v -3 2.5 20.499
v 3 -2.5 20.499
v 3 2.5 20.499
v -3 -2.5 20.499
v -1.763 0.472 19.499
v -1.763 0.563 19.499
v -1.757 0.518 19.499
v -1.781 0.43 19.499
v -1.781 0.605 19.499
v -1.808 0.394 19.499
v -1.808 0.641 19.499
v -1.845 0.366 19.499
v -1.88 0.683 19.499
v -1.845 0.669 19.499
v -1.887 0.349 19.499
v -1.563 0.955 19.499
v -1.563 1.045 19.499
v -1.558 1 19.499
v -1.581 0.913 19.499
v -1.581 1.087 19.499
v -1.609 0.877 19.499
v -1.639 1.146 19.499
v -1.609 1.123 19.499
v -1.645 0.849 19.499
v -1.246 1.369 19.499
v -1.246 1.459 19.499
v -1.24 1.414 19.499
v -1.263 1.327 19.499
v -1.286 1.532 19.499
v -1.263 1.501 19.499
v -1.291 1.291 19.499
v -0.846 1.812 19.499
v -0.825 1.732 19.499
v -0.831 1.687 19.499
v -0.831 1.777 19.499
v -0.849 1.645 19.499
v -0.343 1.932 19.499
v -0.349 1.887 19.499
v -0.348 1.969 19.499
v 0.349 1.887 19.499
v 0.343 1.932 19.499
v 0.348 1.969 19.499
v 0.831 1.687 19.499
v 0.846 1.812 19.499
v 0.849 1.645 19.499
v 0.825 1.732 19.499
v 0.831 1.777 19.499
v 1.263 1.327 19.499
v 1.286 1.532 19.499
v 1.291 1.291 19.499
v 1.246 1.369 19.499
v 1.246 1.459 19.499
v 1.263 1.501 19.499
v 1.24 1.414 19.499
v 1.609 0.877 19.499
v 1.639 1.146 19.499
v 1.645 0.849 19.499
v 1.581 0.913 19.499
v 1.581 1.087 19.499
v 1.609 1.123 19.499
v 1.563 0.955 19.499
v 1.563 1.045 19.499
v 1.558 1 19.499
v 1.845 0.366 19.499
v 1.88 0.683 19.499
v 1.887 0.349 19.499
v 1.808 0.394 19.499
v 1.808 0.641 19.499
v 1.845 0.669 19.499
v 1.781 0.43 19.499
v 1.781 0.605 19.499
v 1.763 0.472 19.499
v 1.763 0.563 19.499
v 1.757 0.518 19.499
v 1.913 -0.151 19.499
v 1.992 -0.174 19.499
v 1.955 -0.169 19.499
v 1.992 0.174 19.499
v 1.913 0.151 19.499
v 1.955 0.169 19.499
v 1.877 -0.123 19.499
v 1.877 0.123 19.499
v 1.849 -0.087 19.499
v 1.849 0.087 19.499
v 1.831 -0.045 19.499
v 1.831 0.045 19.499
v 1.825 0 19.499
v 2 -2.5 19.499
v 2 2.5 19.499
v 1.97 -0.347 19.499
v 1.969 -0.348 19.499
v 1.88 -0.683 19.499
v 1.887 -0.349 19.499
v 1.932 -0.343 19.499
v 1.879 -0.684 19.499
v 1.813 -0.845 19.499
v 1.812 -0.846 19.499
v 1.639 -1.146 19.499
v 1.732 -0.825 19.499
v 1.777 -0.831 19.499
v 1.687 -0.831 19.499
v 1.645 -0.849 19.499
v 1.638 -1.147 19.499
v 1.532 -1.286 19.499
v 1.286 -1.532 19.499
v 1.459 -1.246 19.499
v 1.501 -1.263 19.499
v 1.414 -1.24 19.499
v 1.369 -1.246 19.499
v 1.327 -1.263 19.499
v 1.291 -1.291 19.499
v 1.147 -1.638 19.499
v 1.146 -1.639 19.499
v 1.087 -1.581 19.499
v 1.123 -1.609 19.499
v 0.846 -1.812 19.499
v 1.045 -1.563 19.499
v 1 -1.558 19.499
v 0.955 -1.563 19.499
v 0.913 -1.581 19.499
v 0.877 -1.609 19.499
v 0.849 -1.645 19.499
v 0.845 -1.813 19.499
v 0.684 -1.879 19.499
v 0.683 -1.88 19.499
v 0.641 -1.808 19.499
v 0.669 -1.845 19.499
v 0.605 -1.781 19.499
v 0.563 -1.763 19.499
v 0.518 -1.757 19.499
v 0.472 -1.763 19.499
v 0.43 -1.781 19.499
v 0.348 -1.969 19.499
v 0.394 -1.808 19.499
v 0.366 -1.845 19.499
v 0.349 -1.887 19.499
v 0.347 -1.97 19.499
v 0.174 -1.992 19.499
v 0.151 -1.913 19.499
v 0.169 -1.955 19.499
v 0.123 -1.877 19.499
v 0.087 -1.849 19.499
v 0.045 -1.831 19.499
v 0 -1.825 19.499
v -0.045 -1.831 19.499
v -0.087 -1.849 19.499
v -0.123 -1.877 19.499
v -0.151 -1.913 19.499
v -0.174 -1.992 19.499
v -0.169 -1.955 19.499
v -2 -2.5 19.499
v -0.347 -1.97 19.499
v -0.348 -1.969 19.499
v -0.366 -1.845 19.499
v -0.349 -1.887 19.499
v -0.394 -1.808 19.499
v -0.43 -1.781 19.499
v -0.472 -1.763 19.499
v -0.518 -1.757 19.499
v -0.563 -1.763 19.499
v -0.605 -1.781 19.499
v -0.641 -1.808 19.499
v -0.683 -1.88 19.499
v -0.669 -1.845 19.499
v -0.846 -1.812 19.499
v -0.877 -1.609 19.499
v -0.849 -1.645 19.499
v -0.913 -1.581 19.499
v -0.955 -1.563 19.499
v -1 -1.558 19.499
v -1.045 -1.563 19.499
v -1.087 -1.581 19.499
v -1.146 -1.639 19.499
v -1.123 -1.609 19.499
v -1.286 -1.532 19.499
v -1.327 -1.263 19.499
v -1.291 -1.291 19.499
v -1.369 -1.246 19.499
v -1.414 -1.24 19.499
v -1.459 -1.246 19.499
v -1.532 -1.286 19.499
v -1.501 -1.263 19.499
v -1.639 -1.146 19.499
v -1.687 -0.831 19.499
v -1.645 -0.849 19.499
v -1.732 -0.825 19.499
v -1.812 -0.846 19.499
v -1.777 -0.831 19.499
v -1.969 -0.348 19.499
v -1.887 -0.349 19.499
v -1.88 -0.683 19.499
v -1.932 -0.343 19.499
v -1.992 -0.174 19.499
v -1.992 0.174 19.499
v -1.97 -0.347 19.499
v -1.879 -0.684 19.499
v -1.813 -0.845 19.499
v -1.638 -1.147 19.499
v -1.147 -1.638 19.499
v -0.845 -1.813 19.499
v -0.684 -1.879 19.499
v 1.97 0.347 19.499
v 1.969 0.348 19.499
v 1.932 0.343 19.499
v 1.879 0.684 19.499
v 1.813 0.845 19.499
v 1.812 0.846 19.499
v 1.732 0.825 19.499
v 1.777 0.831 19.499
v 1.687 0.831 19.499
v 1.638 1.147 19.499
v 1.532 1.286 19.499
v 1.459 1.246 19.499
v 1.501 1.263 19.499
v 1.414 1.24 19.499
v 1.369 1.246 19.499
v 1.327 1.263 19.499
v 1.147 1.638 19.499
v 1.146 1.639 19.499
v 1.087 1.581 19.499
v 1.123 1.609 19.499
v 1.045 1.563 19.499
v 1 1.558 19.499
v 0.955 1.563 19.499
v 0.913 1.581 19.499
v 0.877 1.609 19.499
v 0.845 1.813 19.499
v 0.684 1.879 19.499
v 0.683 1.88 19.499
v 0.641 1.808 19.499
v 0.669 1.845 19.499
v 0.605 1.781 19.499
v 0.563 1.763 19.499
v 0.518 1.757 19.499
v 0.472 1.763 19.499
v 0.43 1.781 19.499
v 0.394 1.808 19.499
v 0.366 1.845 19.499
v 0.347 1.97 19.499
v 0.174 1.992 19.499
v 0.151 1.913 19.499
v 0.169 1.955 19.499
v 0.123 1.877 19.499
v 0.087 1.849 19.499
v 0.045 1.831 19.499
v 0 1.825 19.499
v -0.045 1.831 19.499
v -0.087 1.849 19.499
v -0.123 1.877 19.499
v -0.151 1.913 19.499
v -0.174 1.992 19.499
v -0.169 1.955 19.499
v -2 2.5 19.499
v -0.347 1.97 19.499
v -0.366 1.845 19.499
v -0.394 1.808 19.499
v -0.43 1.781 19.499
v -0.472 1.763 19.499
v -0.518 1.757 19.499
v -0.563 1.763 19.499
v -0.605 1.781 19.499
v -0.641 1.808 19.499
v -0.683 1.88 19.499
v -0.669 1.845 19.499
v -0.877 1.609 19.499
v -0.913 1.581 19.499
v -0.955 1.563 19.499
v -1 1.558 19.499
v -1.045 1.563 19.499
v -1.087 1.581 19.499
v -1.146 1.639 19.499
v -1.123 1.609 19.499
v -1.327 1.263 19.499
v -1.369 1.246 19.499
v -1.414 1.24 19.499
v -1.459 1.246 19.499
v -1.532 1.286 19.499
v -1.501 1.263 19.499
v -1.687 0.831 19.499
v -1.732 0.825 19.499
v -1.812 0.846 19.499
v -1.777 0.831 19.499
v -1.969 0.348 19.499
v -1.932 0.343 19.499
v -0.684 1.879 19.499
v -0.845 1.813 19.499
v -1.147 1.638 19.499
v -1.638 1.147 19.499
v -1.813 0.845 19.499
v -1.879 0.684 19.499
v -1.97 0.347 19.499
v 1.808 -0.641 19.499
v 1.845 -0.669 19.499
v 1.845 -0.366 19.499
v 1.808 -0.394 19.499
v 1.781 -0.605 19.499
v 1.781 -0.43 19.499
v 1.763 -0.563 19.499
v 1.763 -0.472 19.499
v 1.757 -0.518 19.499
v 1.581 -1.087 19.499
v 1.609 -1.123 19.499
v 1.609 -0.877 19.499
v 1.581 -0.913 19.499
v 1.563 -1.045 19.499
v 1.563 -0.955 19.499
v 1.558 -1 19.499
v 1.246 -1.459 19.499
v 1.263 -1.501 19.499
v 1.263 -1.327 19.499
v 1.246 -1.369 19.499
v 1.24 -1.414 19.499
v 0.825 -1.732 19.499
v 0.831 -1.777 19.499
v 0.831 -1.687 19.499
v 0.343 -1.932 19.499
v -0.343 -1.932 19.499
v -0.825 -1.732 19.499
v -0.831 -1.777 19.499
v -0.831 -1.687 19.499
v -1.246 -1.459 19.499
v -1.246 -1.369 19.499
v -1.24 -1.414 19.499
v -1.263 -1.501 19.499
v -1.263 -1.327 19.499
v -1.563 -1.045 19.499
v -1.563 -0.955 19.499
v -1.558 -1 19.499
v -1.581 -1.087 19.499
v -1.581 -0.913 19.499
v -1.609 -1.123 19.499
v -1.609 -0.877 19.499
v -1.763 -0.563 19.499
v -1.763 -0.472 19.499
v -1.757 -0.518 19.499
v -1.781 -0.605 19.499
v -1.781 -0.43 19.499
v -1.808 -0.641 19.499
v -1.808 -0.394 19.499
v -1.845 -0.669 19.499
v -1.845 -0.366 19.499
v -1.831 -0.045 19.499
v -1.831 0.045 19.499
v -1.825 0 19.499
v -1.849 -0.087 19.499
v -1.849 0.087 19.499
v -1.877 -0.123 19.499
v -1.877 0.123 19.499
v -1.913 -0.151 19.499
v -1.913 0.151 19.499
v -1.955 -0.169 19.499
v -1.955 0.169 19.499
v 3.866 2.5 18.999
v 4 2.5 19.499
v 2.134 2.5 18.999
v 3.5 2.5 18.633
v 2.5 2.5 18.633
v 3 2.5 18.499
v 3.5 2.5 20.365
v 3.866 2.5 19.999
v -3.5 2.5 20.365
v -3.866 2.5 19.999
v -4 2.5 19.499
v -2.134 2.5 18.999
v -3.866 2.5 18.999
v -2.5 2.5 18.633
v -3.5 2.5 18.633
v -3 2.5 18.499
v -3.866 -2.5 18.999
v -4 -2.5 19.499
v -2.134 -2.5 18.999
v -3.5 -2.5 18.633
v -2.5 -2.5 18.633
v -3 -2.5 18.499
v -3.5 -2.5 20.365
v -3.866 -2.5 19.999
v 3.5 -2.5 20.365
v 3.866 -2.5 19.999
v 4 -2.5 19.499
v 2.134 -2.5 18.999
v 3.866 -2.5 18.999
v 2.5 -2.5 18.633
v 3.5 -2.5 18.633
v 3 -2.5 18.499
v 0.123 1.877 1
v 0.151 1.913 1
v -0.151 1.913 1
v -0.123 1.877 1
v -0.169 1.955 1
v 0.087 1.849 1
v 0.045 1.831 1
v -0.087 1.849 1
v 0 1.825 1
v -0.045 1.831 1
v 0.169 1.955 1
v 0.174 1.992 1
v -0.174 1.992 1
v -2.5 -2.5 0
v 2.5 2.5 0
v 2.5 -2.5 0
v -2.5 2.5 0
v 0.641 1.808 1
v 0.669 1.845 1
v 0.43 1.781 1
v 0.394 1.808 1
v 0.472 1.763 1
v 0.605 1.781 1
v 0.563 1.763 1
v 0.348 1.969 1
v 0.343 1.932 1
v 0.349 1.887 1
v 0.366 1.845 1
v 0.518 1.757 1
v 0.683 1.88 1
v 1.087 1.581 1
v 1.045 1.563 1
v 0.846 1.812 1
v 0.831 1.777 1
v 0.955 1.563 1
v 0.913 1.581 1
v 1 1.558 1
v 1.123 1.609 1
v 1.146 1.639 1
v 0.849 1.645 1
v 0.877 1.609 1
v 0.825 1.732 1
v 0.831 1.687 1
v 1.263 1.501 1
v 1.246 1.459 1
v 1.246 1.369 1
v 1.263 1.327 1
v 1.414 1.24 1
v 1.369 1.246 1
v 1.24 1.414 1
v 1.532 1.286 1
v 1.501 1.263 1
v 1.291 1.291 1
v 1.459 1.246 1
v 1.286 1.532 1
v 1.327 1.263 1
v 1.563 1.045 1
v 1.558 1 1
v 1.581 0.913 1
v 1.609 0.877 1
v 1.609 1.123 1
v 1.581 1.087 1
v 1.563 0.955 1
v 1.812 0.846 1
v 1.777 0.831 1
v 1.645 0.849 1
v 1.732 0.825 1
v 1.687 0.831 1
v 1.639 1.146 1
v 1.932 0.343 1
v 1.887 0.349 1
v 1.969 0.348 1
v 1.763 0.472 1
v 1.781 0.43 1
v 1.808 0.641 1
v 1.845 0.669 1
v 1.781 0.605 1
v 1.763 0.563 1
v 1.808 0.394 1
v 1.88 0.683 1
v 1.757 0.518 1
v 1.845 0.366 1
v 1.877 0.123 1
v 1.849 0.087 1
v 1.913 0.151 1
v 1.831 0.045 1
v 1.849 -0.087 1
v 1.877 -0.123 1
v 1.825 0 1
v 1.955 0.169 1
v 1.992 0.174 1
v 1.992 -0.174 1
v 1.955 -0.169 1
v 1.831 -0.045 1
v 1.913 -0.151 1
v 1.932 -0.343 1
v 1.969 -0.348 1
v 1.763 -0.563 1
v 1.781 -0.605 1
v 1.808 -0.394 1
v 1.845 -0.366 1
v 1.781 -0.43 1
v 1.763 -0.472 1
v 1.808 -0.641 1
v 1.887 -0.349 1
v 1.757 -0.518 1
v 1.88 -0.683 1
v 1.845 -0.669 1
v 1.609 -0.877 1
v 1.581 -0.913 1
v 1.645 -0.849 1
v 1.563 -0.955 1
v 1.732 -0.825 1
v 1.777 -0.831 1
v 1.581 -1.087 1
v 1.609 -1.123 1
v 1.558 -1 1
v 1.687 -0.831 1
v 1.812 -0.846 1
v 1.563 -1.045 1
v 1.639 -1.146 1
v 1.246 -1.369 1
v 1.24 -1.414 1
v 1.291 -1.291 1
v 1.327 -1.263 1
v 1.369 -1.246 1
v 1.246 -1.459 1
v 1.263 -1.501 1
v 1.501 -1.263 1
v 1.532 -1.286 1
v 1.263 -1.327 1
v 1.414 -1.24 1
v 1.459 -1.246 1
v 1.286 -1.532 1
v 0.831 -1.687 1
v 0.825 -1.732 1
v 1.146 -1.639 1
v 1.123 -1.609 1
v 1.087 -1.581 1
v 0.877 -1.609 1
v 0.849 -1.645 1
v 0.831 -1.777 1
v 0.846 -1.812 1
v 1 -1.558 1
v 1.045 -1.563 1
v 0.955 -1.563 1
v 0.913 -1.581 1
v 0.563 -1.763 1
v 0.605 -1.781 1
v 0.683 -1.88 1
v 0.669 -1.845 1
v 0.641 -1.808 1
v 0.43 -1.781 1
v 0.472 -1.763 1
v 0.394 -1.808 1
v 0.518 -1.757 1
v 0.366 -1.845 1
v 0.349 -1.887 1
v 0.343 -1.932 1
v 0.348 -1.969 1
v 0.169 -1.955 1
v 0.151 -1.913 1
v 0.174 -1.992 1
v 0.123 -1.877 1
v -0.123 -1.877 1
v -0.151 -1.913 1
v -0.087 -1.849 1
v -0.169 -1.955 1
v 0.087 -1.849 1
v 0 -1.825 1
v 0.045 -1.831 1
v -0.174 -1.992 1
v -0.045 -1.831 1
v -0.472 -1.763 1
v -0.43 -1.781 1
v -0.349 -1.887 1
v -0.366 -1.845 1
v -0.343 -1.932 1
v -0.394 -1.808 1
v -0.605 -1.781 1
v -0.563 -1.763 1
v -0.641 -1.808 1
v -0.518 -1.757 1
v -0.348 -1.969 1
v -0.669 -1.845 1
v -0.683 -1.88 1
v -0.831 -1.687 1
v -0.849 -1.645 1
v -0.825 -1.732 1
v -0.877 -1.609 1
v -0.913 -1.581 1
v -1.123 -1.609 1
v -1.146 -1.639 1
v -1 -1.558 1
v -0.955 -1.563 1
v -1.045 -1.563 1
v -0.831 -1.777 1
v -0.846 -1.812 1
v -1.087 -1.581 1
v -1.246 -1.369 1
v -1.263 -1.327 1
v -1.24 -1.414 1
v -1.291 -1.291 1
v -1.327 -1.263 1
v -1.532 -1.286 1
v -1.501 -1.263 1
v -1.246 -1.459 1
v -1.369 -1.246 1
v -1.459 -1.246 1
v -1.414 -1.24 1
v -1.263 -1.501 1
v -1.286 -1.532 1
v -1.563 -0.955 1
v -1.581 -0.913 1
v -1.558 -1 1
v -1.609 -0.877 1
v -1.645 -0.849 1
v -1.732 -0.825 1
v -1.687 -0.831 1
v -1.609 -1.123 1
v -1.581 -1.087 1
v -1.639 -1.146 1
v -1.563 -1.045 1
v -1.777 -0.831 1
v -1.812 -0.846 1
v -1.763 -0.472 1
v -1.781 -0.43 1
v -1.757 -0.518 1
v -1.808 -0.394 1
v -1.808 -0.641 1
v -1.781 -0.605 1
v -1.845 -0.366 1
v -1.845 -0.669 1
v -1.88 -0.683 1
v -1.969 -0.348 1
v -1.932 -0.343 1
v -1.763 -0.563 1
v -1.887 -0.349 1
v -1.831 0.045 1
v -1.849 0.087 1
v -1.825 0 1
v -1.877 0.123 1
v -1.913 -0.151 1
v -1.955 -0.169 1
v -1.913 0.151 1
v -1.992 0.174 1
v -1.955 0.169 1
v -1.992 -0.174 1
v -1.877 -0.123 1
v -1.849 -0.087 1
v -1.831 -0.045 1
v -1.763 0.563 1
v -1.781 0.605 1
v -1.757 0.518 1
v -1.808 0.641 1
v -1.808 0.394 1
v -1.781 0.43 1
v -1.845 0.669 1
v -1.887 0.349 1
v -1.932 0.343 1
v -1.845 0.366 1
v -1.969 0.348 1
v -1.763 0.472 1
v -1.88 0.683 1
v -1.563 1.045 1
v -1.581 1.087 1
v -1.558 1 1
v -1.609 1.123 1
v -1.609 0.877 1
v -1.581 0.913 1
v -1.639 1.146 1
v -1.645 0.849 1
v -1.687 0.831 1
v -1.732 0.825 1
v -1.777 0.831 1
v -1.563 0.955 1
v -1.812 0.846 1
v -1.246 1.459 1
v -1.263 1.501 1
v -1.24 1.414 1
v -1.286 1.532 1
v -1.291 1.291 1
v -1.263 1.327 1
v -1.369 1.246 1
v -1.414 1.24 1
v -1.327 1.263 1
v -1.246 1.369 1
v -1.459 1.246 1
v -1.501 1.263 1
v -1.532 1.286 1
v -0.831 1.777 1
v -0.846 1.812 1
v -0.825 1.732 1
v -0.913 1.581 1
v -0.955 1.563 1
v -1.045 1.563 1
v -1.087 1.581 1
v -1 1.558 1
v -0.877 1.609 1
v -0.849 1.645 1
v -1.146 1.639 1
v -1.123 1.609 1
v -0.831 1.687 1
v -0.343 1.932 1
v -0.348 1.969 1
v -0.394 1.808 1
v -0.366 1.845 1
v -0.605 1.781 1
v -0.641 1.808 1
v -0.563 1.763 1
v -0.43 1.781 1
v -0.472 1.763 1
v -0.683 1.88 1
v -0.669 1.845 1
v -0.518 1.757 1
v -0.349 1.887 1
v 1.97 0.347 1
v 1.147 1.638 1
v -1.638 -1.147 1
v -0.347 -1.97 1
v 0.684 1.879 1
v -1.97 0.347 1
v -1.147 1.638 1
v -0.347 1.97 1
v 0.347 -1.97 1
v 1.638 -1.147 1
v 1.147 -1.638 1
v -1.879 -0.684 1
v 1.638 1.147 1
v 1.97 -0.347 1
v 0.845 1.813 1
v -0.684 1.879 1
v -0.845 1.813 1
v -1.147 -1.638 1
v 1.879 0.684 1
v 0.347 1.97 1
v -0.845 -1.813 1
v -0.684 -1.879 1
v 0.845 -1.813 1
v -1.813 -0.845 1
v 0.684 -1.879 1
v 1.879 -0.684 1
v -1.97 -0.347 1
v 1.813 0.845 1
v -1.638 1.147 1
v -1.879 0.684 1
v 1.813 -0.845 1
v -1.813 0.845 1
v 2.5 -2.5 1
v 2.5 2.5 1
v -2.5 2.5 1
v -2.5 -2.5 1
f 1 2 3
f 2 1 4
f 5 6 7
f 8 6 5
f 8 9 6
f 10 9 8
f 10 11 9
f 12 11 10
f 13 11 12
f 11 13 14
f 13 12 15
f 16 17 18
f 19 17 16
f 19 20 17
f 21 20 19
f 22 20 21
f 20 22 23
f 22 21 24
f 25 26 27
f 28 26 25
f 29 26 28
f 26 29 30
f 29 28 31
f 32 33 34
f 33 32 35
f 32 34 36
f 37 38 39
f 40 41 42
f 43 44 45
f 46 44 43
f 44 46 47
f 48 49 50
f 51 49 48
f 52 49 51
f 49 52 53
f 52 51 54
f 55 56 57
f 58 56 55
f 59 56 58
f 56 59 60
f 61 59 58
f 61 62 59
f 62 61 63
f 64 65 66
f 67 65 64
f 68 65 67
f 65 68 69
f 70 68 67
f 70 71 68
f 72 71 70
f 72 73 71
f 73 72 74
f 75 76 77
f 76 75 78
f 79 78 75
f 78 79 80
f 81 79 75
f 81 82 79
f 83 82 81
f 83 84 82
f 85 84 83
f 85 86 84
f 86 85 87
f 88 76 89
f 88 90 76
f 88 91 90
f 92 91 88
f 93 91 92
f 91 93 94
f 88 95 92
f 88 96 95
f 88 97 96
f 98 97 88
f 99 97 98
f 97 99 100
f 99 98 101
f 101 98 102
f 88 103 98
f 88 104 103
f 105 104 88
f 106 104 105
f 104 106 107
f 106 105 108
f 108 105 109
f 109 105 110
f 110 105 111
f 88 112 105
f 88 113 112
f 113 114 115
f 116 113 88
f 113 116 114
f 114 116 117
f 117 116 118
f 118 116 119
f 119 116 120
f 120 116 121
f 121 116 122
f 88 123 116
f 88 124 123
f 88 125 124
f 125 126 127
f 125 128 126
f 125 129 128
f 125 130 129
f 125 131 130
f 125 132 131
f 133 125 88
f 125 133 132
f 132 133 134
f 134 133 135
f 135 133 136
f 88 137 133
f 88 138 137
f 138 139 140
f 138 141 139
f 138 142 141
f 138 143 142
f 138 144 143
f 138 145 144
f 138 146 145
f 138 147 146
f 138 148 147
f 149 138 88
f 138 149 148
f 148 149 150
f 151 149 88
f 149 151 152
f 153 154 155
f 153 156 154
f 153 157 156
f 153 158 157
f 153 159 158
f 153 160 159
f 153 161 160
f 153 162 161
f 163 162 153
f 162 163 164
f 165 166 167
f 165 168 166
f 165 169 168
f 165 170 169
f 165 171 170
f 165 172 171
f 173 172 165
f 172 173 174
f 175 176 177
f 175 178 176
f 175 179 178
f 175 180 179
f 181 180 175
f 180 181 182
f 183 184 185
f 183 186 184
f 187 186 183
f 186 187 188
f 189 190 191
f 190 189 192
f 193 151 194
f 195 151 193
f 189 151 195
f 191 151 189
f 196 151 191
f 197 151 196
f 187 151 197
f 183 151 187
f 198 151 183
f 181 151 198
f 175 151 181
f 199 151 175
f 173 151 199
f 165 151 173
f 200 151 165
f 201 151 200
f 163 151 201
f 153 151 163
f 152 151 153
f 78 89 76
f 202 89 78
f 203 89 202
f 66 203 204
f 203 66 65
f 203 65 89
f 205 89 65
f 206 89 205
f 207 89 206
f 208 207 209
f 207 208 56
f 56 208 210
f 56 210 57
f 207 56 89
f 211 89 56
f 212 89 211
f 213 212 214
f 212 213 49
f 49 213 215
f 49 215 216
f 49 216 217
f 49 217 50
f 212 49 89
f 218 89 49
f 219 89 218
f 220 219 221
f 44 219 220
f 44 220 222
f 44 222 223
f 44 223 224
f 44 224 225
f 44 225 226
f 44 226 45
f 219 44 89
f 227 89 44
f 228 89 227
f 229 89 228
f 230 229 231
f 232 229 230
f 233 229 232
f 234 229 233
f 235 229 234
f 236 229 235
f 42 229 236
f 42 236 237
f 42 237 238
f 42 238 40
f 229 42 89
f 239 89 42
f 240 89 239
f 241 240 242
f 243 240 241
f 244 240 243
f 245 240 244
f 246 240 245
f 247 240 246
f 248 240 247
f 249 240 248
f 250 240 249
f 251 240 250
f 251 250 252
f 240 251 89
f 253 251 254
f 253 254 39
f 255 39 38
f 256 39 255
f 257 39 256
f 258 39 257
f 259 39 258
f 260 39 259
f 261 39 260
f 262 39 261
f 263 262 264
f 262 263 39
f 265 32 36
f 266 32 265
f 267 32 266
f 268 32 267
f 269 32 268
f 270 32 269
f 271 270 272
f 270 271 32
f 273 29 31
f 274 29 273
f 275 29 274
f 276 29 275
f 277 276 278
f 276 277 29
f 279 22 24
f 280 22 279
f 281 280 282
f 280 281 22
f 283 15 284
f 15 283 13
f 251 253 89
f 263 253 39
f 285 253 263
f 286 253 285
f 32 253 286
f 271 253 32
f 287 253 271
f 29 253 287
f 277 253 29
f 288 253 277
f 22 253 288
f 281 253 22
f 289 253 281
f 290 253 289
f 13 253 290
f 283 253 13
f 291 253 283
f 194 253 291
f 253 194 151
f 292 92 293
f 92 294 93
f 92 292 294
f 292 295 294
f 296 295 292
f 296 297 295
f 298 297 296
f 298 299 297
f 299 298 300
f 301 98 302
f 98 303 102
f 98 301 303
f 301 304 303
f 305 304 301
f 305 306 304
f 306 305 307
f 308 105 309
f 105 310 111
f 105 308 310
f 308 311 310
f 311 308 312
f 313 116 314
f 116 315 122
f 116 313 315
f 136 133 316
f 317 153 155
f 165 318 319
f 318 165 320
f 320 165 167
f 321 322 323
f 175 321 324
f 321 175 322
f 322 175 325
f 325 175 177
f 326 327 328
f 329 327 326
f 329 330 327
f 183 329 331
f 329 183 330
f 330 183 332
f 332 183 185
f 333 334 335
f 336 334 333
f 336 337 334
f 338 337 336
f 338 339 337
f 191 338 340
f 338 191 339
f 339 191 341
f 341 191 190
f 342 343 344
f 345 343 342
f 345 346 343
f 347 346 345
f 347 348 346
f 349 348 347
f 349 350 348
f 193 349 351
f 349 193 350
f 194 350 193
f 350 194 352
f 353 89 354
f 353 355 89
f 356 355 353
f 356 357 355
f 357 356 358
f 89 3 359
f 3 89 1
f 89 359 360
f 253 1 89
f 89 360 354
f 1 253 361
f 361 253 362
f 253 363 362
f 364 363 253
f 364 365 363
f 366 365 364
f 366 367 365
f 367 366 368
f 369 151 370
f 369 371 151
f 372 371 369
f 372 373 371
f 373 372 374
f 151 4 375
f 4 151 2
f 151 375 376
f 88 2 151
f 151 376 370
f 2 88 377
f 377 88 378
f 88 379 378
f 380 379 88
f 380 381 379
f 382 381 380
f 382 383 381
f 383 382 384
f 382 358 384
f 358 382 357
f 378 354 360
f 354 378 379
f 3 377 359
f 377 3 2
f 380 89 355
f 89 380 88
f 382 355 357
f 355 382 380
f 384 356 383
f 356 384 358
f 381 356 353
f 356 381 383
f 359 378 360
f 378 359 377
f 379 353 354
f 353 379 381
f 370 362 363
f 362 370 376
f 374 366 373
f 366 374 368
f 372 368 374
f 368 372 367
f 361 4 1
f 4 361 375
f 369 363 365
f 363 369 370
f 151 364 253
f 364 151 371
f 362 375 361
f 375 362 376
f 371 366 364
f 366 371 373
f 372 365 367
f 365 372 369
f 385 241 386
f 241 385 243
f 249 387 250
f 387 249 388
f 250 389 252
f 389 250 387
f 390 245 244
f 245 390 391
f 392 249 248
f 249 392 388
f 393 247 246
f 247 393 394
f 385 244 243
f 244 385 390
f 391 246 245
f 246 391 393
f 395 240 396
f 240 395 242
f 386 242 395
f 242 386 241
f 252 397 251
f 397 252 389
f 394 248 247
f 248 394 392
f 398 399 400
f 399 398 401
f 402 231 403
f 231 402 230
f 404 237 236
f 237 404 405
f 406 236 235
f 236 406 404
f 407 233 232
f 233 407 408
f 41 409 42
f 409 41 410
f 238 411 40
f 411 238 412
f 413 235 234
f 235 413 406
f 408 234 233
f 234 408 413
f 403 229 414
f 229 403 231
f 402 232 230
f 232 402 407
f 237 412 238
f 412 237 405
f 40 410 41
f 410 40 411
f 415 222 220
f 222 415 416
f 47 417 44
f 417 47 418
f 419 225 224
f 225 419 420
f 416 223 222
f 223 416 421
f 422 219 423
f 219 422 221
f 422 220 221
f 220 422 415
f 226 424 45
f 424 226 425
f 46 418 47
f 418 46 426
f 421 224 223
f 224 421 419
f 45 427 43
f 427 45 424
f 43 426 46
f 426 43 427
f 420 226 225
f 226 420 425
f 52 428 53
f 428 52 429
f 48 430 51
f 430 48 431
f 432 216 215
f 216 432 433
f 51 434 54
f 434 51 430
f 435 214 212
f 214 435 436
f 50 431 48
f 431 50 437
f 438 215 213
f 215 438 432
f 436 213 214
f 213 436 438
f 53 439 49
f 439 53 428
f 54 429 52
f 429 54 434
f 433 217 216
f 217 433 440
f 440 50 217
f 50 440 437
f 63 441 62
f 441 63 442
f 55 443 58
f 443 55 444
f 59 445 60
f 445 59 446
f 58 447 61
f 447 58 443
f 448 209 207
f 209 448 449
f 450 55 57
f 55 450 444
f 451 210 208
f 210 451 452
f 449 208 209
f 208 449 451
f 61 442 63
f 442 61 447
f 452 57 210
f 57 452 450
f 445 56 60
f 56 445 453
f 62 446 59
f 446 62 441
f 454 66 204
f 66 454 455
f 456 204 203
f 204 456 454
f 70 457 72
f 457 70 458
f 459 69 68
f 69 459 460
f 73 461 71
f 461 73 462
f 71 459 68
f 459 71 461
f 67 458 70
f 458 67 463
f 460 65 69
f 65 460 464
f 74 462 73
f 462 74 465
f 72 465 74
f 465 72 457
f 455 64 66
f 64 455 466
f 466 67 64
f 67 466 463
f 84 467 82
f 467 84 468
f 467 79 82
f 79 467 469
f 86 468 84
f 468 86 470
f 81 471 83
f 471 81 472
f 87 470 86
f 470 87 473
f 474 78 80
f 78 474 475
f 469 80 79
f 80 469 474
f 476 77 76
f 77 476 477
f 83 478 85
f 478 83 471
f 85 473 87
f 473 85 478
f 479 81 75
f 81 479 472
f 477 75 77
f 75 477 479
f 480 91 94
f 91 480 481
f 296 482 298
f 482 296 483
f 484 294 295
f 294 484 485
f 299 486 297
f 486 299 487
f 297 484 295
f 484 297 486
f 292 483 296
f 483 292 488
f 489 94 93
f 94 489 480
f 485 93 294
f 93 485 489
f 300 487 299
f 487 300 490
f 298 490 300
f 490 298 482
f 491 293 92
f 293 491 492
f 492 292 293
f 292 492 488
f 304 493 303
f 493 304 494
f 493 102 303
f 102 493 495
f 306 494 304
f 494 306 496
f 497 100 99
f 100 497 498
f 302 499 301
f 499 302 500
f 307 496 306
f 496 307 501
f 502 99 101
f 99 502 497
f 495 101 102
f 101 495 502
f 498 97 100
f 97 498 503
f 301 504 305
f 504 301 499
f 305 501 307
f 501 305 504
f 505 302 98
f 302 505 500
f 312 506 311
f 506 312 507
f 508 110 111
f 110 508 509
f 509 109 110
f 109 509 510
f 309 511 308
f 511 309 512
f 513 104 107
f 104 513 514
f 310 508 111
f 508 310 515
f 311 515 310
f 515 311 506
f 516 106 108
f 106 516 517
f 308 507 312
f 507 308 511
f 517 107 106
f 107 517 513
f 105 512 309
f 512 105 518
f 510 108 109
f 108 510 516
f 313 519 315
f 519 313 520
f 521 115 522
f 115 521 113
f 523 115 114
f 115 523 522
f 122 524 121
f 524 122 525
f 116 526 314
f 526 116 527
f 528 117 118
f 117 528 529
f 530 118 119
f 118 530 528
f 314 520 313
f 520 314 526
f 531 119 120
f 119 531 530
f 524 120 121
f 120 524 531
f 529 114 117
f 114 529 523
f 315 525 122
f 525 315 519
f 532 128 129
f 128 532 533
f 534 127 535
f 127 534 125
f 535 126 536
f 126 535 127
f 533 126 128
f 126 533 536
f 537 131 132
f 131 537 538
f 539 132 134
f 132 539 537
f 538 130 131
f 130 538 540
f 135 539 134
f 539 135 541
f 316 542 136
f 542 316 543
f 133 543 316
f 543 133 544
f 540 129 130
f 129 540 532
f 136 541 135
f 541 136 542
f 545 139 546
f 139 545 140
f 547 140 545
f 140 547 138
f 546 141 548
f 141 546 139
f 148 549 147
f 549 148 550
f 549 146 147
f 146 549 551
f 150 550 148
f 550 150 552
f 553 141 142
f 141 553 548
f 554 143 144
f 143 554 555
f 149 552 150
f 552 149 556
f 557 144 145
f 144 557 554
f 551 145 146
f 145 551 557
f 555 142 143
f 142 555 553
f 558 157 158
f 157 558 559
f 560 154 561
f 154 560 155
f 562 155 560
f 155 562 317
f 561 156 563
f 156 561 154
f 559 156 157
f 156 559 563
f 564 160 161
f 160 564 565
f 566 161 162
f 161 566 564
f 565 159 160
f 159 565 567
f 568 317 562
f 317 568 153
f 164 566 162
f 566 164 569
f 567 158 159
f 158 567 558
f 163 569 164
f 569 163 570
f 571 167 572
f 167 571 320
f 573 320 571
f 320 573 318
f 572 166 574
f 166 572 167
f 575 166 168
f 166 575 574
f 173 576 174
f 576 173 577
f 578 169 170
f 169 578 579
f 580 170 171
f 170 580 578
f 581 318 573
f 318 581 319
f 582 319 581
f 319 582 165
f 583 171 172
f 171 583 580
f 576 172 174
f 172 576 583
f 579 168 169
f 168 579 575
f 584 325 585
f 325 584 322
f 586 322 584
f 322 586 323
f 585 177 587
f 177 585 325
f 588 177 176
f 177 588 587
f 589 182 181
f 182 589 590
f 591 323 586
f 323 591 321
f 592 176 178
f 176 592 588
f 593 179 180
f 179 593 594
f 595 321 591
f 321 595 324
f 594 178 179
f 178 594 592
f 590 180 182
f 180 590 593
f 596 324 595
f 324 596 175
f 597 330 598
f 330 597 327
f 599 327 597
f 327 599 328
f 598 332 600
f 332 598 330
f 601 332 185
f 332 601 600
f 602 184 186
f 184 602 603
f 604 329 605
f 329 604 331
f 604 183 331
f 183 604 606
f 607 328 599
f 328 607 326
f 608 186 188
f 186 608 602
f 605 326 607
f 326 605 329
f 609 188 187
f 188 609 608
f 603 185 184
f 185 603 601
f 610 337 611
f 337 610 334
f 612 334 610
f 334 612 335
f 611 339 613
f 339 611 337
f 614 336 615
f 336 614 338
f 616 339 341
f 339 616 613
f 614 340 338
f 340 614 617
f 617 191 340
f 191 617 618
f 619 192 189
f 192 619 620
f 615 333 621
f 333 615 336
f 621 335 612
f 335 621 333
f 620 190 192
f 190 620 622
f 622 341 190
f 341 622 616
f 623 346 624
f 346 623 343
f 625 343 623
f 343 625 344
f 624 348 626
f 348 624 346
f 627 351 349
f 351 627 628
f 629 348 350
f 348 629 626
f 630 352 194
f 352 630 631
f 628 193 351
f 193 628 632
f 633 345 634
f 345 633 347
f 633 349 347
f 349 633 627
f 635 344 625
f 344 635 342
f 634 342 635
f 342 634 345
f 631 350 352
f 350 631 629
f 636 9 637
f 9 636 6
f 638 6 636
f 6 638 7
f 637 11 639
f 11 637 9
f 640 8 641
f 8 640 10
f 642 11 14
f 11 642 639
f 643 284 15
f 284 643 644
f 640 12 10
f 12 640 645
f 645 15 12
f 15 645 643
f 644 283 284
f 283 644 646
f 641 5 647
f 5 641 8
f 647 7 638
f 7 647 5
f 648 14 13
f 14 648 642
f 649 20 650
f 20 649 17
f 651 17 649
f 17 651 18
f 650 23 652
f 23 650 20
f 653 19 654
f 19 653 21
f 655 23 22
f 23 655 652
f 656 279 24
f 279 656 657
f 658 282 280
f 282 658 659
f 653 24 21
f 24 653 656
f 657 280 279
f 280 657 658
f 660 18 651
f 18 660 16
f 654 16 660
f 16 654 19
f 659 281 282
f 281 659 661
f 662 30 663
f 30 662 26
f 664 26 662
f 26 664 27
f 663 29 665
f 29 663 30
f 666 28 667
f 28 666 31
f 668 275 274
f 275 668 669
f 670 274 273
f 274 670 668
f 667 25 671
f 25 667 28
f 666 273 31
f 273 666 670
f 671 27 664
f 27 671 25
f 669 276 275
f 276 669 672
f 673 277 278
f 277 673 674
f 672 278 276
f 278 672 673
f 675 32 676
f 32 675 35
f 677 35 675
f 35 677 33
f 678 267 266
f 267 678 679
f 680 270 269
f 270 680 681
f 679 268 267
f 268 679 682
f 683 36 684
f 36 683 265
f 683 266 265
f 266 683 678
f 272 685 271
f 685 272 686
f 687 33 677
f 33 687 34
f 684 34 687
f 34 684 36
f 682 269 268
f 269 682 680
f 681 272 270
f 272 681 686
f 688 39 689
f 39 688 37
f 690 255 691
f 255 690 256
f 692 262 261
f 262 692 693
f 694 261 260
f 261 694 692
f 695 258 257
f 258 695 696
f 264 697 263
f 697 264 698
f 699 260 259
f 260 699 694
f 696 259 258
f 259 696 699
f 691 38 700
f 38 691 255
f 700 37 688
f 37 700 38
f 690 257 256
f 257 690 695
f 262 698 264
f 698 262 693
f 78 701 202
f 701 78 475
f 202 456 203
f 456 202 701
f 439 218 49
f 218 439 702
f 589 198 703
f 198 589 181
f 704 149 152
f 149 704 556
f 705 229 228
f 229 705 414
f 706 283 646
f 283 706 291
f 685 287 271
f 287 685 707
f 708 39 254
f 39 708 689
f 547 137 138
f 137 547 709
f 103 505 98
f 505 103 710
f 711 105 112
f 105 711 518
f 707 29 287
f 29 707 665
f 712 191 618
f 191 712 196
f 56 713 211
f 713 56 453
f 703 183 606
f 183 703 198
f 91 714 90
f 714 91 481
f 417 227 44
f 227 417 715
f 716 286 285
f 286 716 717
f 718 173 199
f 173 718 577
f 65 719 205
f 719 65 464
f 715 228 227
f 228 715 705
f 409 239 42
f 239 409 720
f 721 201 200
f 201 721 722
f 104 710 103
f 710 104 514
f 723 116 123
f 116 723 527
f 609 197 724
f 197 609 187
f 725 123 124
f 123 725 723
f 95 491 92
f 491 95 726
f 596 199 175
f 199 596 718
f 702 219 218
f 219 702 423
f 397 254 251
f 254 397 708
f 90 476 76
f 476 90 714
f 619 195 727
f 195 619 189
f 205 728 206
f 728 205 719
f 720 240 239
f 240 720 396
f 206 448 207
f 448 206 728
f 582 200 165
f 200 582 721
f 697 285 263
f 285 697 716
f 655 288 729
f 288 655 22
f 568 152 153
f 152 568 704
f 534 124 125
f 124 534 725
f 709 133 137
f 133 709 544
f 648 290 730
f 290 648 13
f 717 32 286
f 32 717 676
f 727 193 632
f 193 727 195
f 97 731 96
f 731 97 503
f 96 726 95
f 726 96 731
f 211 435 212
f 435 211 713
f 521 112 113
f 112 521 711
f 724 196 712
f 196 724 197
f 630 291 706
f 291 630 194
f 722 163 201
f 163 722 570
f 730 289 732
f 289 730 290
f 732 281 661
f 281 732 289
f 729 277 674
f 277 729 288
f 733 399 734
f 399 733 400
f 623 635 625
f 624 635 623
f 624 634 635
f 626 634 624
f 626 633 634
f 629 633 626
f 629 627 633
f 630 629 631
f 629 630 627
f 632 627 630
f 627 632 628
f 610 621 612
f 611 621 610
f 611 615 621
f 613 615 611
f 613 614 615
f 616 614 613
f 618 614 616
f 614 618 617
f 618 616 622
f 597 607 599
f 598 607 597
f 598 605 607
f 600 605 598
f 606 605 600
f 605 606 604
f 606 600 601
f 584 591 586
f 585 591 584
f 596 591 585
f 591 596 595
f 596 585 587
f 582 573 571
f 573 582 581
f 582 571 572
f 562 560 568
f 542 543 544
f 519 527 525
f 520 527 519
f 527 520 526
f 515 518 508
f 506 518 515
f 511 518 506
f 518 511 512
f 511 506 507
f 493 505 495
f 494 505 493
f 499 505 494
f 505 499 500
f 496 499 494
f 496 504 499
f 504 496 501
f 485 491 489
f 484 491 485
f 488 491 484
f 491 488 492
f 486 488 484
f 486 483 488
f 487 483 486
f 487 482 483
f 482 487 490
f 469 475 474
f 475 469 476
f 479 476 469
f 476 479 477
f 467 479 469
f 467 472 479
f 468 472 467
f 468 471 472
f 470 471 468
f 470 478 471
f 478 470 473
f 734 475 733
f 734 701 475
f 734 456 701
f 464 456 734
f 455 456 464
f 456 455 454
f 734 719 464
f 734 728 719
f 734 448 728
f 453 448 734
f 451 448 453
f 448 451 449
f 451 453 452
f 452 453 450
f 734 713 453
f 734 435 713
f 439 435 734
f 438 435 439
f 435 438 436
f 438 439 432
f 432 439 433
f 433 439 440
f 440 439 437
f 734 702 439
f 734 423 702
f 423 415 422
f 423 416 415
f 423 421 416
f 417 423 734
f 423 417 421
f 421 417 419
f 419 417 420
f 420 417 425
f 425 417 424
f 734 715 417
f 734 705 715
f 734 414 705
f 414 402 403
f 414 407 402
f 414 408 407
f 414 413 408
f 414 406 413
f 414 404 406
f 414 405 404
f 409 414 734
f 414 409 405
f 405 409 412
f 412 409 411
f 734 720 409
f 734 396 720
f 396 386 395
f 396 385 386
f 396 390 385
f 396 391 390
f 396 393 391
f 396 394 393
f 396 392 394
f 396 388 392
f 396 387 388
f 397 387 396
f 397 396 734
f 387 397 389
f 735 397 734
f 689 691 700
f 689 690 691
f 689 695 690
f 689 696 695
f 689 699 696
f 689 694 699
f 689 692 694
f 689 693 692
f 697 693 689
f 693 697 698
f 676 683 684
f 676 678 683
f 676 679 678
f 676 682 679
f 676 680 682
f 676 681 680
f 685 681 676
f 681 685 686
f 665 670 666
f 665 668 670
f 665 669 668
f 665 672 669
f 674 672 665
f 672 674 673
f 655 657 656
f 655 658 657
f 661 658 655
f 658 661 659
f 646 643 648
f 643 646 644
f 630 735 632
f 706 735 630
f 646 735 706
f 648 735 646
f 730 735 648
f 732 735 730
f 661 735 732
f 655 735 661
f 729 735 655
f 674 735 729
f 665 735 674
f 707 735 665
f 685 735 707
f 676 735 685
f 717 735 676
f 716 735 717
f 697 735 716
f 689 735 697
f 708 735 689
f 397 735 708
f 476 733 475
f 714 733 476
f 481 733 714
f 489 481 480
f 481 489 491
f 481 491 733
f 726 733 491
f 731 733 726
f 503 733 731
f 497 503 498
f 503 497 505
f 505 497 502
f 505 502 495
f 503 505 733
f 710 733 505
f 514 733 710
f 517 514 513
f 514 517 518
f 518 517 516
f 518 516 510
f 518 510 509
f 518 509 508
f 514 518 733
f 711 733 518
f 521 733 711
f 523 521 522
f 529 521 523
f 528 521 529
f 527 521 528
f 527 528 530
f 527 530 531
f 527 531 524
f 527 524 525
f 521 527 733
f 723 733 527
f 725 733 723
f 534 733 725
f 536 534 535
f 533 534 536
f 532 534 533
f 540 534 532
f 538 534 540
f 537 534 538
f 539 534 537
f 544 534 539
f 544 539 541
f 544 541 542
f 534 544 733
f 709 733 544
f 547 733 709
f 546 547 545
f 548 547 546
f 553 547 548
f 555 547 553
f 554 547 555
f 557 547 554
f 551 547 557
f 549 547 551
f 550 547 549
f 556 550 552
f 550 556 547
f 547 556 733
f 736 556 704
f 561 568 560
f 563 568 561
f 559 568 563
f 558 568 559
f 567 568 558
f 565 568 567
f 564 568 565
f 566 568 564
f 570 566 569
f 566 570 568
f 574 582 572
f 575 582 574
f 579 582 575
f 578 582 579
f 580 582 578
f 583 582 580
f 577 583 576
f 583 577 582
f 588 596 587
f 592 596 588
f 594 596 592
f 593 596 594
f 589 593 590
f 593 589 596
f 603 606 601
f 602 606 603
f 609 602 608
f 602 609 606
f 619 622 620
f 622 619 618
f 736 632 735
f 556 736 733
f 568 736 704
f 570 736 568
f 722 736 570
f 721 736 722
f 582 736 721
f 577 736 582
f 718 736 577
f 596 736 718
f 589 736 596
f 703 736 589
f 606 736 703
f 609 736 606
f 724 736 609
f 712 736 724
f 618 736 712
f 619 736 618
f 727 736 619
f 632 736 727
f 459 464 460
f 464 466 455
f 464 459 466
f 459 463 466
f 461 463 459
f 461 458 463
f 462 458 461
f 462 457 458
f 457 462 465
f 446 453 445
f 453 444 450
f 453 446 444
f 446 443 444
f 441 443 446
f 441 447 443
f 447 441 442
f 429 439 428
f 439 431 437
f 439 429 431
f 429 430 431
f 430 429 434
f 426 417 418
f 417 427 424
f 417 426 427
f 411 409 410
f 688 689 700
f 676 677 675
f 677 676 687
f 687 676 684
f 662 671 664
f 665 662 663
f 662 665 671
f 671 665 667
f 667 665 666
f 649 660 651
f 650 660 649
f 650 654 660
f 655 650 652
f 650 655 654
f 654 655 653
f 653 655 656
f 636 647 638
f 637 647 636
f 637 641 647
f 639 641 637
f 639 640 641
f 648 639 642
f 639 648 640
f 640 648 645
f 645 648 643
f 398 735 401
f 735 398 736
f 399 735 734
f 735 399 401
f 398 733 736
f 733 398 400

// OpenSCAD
//Customizable Column v1.2
//v1.2 Customizer fix, added ionic capital
//v1.0 had 10 downloads
//v1.1 had 381 downloads
//Created by Ari M. Diacou, October 2014
//Shared under Creative Commons License: Attribution-ShareAlike 3.0 Unported (CC BY-SA 3.0) 
//see http://creativecommons.org/licenses/by-sa/3.0/


//The ratio of the height to the width of the column
ratio=5;
//The length of the column including the base and capital
height=20;
//Stripes that go up the column
fluting="roman";//[roman,greek,none]
capital="ionic";//[corinthian,simple,ionic]


						/*[Hidden]*/
///////////////// Variables //////////////////////////
pi=3.1415+0;
ep=0.001+0;
width=height/ratio;
capital_height=(capital=="corinthian")
				  ? width*1.3 
				  : width*0.25;
//types=["tuscan","doric","ionic","corinthian"]+0;
//chosen_type="tuscan";//["tuscan","doric","ionic","corinthian"]+0;
//x=search(chosen_type,types)+0;
//echo(x);

////////////////// Main() ///////////////////////////
column();
//////////////// Functions ////////////////////////////
module column(){
	bottom();
	top();
	shaft();
	}

module top(){
	translate([0,0,height-ep]){
        if(capital=="corinthian"){
            corinthian_capital();}
        if(capital=="ionic"){
            ionic_capital();}
        if(capital=="simple"){
            cube([width*1.25,width*1.25,width*0.25],center=true);}
        }
	}

module bottom(){
	translate([0,0,width*0.125]) 
		cube([width*1.25,width*1.25,width*0.25],center=true);
	}

module shaft(){
	difference(){
		cylinder(h=height, r=width/2,$fn=72);
		if(fluting=="greek" || fluting=="roman"){
			for(i=[0:23]){
				translate((width/2)*[sin((360/24)*i),cos((360/24)*i),0])
					cylinder(h=height, 
								r=(fluting=="greek")? (pi*width/2/24):(pi*width/2/36),
								$fn=24);
				}
			}
		}
	}

module ionic_capital(){
    x=width*0.5+capital_height;
    y=width*.625;
    z=-0.5*capital_height;
    cube([width+2*capital_height,width*1.25,capital_height],center=true);
    translate([x,y,z])
        rotate([90,0,0])
            cylinder(h=width*1.25,d=capital_height*2,$fn=12);
    translate([-x,y,z])
        rotate([90,0,0])
            cylinder(h=width*1.25,d=capital_height*2,$fn=12);
    }
module corinthian_capital(){
    z=capital_height;
	ep=.001;
	resize([1.2*z,1.2*z,z])
	translate([0,0,-4])
	union(){
		difference(){
			for(i=[1:12]){
				rotate([0,0,(i+0.0)*30]) petal(3);
				rotate([0,0,(i+0.5)*45]) petal2(3);
				rotate([0,0,(i+0.5)*90]) petal3(3);
				}
			cube([16,16,8],center=true);
			}
		translate([0,0,7+6+.5-ep]) cube([12,12,1],center=true);
		}
	}
module petal(x){
	translate([0,-x,0])
	linear_extrude(height = 7, center = false, convexity = 10, scale=[1,2], $fn=24)
		translate([0, x, 0])
			circle(r = 1.5);
	}

module petal2(x){
	translate([0,-x,3])
	linear_extrude(height = 7, center = false, convexity = 10, scale=[1,2], $fn=24)
		translate([0, x, 0])
			circle(r = 1.5);
	}

module petal3(x){
	translate([0,-x,6])
	linear_extrude(height = 7, center = false, convexity = 10, scale=[1,1.98], $fn=24)
		translate([0, x, 0])
			circle(r = 2.5);
	}
